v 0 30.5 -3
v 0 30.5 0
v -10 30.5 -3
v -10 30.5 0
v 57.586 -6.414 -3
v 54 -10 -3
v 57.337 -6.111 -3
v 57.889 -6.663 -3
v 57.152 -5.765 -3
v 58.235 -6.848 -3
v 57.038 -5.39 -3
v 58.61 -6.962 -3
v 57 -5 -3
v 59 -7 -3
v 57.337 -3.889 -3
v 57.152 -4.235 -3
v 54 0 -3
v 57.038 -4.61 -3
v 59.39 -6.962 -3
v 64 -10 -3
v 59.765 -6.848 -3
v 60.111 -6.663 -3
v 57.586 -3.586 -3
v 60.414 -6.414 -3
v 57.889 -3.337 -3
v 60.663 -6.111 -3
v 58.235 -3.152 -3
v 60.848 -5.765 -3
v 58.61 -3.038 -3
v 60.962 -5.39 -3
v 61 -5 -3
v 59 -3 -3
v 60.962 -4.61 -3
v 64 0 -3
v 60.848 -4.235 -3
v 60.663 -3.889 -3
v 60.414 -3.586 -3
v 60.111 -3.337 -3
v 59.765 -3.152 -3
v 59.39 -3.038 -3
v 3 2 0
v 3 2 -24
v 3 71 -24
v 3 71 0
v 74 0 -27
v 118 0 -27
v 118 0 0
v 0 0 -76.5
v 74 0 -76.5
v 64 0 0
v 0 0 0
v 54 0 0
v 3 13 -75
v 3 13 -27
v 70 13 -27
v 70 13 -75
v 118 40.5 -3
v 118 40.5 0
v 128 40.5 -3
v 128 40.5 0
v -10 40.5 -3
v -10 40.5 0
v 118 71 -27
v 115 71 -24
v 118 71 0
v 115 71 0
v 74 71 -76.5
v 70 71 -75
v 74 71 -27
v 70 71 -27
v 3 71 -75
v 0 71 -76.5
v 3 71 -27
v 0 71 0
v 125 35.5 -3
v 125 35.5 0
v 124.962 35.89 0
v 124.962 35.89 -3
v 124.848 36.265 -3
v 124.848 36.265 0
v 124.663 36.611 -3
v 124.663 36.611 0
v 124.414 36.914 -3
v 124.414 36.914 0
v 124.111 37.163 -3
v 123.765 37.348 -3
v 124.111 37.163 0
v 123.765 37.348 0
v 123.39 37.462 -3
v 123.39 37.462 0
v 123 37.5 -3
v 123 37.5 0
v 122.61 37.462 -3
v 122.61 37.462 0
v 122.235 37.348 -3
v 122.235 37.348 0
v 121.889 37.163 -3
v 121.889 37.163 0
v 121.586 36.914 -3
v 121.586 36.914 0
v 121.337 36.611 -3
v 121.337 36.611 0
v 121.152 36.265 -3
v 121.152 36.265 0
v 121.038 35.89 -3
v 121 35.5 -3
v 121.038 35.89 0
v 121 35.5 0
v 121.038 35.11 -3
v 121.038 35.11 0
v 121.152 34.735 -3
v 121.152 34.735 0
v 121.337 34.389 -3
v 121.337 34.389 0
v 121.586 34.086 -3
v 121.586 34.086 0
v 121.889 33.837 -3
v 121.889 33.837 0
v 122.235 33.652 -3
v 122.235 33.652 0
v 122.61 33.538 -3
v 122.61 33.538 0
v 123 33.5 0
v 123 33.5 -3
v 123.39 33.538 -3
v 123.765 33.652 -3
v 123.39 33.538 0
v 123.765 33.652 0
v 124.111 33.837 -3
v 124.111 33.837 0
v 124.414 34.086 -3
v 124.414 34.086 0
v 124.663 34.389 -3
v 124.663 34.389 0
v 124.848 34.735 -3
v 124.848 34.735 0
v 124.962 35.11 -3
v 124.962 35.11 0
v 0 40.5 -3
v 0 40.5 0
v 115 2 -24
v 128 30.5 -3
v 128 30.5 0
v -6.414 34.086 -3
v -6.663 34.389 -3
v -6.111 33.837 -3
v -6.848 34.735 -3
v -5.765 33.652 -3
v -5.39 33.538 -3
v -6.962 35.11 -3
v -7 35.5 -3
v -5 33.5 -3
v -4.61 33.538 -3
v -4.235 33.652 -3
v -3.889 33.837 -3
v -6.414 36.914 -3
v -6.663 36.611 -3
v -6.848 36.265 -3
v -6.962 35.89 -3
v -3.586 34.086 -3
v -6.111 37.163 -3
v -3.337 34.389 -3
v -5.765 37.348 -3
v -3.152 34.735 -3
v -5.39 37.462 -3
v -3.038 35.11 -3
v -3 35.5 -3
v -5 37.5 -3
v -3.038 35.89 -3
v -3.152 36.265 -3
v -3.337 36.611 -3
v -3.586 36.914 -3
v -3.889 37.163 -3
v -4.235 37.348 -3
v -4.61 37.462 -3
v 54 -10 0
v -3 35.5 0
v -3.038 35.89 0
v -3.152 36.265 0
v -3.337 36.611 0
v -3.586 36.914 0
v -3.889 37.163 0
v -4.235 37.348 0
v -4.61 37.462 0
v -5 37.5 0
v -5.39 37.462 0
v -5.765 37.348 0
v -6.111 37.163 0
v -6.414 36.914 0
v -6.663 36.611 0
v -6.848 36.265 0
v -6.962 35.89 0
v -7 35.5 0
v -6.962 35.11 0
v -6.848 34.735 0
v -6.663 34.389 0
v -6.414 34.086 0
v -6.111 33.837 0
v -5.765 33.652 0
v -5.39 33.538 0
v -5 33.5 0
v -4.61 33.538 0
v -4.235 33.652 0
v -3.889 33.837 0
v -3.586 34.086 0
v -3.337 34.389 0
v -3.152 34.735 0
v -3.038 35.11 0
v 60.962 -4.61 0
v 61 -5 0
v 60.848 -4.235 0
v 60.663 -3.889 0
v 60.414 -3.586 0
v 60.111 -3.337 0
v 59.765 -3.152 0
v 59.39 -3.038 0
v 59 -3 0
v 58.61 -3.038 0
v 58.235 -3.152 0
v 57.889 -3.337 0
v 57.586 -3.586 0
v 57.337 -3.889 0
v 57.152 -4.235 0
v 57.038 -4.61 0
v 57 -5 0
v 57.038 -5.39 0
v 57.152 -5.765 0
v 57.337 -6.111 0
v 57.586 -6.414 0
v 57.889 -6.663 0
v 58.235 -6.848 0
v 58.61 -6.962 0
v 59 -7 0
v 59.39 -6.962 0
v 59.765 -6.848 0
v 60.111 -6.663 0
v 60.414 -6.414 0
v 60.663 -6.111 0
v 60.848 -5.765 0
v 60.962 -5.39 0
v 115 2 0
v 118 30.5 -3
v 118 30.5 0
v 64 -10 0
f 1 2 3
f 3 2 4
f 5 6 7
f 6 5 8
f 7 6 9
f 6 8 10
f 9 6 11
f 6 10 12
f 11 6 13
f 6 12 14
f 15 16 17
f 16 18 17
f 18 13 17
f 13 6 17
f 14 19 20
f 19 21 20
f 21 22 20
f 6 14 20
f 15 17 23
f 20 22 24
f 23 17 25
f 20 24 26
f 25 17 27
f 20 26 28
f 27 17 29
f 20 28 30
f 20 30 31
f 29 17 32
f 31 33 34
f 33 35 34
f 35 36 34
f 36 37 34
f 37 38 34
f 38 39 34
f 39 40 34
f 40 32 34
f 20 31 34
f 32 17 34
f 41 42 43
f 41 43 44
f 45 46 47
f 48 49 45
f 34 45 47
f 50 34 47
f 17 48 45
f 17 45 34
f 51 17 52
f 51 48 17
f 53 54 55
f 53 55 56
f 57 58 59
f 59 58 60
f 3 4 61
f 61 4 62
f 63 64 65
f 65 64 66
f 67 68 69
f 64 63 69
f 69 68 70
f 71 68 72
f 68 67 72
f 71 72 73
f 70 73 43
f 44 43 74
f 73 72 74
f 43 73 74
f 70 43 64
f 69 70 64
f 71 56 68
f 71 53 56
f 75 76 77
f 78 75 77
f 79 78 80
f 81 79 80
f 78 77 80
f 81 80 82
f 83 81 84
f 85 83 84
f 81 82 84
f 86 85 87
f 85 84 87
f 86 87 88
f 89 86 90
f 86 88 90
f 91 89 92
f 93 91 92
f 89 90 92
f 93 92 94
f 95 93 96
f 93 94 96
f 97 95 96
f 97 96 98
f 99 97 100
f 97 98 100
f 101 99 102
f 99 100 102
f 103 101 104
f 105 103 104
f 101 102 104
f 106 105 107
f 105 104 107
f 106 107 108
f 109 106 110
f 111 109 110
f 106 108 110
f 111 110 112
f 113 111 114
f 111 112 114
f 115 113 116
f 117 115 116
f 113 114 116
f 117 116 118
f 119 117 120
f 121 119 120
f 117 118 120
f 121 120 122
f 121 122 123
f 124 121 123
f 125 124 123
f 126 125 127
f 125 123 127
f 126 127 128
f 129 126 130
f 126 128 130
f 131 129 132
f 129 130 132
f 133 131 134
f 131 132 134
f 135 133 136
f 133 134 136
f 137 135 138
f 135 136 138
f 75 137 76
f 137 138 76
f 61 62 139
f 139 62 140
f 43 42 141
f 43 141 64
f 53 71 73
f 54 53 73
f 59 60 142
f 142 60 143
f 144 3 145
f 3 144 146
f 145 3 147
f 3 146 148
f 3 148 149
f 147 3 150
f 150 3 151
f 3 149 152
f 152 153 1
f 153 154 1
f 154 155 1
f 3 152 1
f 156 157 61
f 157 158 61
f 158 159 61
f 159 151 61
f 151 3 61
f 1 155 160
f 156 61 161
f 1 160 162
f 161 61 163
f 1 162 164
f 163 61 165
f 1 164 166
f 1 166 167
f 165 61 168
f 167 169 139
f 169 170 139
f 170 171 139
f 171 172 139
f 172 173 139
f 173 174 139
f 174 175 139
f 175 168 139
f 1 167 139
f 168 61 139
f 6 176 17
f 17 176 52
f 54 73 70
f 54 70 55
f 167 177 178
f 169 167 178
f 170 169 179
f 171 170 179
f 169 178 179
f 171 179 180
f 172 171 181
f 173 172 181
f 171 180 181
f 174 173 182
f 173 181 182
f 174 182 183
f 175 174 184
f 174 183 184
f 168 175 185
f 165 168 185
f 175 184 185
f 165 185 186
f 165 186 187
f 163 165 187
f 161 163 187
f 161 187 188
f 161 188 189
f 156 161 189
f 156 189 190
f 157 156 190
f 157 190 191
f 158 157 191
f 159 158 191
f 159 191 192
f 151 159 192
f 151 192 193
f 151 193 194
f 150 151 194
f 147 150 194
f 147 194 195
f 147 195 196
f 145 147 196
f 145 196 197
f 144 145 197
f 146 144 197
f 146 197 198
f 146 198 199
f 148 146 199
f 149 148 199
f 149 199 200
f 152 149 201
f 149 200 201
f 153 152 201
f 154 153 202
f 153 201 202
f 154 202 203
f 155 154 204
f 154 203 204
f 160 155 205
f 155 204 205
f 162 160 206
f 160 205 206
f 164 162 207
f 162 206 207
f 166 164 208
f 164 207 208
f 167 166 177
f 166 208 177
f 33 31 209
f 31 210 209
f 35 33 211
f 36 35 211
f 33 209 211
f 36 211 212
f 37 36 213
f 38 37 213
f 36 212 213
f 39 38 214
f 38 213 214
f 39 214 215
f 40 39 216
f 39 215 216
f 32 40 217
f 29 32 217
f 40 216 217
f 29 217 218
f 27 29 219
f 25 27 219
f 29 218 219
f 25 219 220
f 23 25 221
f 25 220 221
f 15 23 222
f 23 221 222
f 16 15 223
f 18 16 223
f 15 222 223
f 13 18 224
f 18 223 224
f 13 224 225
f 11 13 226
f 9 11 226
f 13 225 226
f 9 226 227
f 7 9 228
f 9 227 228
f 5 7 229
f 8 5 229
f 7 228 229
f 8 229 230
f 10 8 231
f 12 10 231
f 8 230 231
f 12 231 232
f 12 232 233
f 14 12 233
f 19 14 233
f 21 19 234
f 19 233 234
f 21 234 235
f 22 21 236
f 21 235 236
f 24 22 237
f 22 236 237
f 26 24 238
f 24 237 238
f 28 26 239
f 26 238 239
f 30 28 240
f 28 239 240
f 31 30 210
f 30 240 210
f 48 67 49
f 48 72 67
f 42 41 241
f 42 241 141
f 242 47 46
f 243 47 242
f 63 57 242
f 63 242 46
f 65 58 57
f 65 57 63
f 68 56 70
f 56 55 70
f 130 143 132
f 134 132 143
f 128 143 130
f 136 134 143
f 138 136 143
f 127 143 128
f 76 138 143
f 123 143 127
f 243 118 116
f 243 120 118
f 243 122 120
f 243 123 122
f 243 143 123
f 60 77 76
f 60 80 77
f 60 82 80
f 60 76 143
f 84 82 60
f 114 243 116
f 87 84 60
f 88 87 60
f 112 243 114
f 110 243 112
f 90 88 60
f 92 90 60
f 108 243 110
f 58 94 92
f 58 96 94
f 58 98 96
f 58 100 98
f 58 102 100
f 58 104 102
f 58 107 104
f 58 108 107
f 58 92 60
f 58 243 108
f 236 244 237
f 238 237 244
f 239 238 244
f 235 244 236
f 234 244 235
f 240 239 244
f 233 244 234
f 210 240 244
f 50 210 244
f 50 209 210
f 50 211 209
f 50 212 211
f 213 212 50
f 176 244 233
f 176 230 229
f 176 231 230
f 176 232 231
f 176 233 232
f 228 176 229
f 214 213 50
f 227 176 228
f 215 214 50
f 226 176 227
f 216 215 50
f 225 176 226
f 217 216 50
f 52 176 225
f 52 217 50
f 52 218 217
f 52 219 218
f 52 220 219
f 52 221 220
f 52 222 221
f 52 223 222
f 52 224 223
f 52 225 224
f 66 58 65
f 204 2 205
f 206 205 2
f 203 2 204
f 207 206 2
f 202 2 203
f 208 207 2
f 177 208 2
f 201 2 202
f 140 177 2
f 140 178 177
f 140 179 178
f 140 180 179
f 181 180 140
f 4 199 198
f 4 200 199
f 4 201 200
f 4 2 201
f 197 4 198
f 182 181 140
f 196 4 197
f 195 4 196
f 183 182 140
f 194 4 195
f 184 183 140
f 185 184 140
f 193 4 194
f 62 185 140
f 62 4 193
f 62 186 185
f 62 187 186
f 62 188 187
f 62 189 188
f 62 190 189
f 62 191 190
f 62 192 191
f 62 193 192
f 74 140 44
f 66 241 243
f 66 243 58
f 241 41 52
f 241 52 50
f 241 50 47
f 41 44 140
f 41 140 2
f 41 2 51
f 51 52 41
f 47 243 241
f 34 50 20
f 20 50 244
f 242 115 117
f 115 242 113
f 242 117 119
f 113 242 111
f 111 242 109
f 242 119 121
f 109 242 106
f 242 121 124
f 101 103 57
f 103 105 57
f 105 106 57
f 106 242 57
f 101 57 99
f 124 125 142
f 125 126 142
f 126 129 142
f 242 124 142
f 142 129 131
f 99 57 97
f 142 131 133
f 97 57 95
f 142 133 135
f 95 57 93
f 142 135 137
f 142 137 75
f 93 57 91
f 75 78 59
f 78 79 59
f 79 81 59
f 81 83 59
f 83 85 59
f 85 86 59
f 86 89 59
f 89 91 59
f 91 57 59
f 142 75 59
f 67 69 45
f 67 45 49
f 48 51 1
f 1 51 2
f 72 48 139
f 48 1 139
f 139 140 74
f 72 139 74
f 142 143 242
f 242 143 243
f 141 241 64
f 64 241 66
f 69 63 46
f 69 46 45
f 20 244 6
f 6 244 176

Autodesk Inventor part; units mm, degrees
ref_plane "YZ Plane" through (0, 0, 0) normal (1, 0, 0) x (0, 1, 0)
ref_plane "XZ Plane" through (0, 0, 0) normal (0, 1, 0) x (-1, 0, 0)
ref_plane "XY Plane" through (0, 0, 0) normal (0, 0, 1) x (1, 0, 0)
sketch "스케치1" plane through (0, 0, 0) normal (1, 0, 0) x (0, 1, 0)
  line L0 (0, 0) -> (72.5, 0)
  line L1 (72.5, 0) -> (72.5, -76.5)
  line L2 (72.5, -76.5) -> (0, -76.5)
  line L3 (0, -76.5) -> (0, 0)
  line L4 (2, -24) -> (71, -24)
  line L5 (71, -24) -> (71, 0)
  line L6 (71, 0) -> (2, 0)
  line L7 (2, 0) -> (2, -24)
  line L8 (13, -75) -> (71, -75)
  line L9 (71, -75) -> (71, -27)
  line L10 (71, -27) -> (13, -27)
  line L11 (13, -27) -> (13, -75)
  line L12 (71, -27) -> (71, -24)
  line L13 (71, -75) -> (71, -76.5)
  point P0 (71, 0)
  point P1 (2, 0)
  dimension "d1" = 69
  dimension "d3" = 58
  dimension "d4" = 1.5
  dimension "d5" = 3
  dimension "d6" = 24
  dimension "d7" = 48
  dimension "d8" = 1.5
  dimension "d9" = 2
extrude "돌출1" add sketch "스케치1" along normal blind 118 contours L0 L7 L4 L12 L10 L11 L8 L13 L2 L3 | L0 L5 L4 L7 | L8 L11 L10 L9
extrude "돌출2" cut sketch "스케치1" along normal blind 70 contours L8 L11 L10 L9
extrude "돌출3" cut sketch "스케치1" along normal blind 115 contours L0 L5 L4 L7
sketch "스케치2" plane through (0, 71, -76.5) normal (0, 1, 0) x (1, 0, 0)
  line L0 (118, 0) -> (118, -76.5) projected
  line L1 (0, 0) -> (118, 0) projected
  line L2 (70, -1.5) -> (70, -49.5) projected
  line L3 (70, -49.5) -> (0, -49.5) projected
  line L4 (74, 0) -> (118, 0)
  line L5 (118, 0) -> (118, -49.5)
  line L6 (118, -49.5) -> (74, -49.5)
  line L7 (74, -49.5) -> (74, 0)
  point P0 (0, -76.5)
  dimension "d16" = 4
extrude "돌출4" cut sketch "스케치2" against normal blind 113
sketch "스케치3" plane through (0, 0, 0) normal (-1, 0, 0) x (0, 0, 1)
  line L0 (0, 2) -> (-24, 2) projected
  line L1 (-24, 2) -> (-24, 71) projected
  line L2 (-27, 71) -> (-27, 13) projected
  line L3 (-27, 13) -> (-75, 13) projected
  line L4 (-75, 13) -> (-75, 71) projected
  line L5 (-24, 71) -> (0, 71) projected
  line L6 (0, 2) -> (0, 71)
  line L7 (0, 71) -> (-24, 71)
  line L8 (-24, 71) -> (-75, 71)
extrude "돌출5" add sketch "스케치3" against normal blind 3
sketch "스케치4" plane through (0, 0, 0) normal (0, 0, 1) x (1, 0, 0)
  line L0 (0, 71) -> (0, 0) projected
  line L1 (0, 0) -> (118, 0) projected
  line L2 (118, 71) -> (118, 0) projected
  line L3 (118, 71) -> (0, 71)
  line L4 (0, 0) -> (74, 0) projected
  line L5 (59, 0) -> (59, 71) construction
  line L6 (118, 35.5) -> (0, 35.5) construction
  line L7 (118, 40.5) -> (128, 40.5)
  line L8 (128, 40.5) -> (128, 30.5)
  line L9 (128, 30.5) -> (118, 30.5)
  line L10 (118, 30.5) -> (118, 40.5)
  circle A0 centre (123, 35.5) radius 2
  line L11 (54, 0) -> (64, 0)
  line L12 (64, 0) -> (64, -10)
  line L13 (64, -10) -> (54, -10)
  line L14 (54, -10) -> (54, 0)
  circle A1 centre (59, -5) radius 2
  line L15 (-10, 40.5) -> (0, 40.5)
  line L16 (0, 40.5) -> (0, 30.5)
  line L17 (0, 30.5) -> (-10, 30.5)
  line L18 (-10, 30.5) -> (-10, 40.5)
  circle A2 centre (-5, 35.5) radius 2
  point P0 (54, 0)
  dimension "d21" = 10
  dimension "d22" = 10
  dimension "d23" = 4
  dimension "d24" = 5
  dimension "d25" = 5
  dimension "d26" = 10
  dimension "d27" = 10
  dimension "d28" = 4
  dimension "d29" = 5
  dimension "d30" = 5
  dimension "d31" = 10
  dimension "d32" = 10
  dimension "d33" = 4
  dimension "d34" = 5
  dimension "d35" = 5
  dimension "d38" = 40.5
  dimension "d39" = 128
extrude "돌출6" add sketch "스케치4" against normal blind 3 contours L0 L17 L18 L15 | L7 L8 L9 L2 | L1 L12 L13 L14
properties part number "battery_base"
